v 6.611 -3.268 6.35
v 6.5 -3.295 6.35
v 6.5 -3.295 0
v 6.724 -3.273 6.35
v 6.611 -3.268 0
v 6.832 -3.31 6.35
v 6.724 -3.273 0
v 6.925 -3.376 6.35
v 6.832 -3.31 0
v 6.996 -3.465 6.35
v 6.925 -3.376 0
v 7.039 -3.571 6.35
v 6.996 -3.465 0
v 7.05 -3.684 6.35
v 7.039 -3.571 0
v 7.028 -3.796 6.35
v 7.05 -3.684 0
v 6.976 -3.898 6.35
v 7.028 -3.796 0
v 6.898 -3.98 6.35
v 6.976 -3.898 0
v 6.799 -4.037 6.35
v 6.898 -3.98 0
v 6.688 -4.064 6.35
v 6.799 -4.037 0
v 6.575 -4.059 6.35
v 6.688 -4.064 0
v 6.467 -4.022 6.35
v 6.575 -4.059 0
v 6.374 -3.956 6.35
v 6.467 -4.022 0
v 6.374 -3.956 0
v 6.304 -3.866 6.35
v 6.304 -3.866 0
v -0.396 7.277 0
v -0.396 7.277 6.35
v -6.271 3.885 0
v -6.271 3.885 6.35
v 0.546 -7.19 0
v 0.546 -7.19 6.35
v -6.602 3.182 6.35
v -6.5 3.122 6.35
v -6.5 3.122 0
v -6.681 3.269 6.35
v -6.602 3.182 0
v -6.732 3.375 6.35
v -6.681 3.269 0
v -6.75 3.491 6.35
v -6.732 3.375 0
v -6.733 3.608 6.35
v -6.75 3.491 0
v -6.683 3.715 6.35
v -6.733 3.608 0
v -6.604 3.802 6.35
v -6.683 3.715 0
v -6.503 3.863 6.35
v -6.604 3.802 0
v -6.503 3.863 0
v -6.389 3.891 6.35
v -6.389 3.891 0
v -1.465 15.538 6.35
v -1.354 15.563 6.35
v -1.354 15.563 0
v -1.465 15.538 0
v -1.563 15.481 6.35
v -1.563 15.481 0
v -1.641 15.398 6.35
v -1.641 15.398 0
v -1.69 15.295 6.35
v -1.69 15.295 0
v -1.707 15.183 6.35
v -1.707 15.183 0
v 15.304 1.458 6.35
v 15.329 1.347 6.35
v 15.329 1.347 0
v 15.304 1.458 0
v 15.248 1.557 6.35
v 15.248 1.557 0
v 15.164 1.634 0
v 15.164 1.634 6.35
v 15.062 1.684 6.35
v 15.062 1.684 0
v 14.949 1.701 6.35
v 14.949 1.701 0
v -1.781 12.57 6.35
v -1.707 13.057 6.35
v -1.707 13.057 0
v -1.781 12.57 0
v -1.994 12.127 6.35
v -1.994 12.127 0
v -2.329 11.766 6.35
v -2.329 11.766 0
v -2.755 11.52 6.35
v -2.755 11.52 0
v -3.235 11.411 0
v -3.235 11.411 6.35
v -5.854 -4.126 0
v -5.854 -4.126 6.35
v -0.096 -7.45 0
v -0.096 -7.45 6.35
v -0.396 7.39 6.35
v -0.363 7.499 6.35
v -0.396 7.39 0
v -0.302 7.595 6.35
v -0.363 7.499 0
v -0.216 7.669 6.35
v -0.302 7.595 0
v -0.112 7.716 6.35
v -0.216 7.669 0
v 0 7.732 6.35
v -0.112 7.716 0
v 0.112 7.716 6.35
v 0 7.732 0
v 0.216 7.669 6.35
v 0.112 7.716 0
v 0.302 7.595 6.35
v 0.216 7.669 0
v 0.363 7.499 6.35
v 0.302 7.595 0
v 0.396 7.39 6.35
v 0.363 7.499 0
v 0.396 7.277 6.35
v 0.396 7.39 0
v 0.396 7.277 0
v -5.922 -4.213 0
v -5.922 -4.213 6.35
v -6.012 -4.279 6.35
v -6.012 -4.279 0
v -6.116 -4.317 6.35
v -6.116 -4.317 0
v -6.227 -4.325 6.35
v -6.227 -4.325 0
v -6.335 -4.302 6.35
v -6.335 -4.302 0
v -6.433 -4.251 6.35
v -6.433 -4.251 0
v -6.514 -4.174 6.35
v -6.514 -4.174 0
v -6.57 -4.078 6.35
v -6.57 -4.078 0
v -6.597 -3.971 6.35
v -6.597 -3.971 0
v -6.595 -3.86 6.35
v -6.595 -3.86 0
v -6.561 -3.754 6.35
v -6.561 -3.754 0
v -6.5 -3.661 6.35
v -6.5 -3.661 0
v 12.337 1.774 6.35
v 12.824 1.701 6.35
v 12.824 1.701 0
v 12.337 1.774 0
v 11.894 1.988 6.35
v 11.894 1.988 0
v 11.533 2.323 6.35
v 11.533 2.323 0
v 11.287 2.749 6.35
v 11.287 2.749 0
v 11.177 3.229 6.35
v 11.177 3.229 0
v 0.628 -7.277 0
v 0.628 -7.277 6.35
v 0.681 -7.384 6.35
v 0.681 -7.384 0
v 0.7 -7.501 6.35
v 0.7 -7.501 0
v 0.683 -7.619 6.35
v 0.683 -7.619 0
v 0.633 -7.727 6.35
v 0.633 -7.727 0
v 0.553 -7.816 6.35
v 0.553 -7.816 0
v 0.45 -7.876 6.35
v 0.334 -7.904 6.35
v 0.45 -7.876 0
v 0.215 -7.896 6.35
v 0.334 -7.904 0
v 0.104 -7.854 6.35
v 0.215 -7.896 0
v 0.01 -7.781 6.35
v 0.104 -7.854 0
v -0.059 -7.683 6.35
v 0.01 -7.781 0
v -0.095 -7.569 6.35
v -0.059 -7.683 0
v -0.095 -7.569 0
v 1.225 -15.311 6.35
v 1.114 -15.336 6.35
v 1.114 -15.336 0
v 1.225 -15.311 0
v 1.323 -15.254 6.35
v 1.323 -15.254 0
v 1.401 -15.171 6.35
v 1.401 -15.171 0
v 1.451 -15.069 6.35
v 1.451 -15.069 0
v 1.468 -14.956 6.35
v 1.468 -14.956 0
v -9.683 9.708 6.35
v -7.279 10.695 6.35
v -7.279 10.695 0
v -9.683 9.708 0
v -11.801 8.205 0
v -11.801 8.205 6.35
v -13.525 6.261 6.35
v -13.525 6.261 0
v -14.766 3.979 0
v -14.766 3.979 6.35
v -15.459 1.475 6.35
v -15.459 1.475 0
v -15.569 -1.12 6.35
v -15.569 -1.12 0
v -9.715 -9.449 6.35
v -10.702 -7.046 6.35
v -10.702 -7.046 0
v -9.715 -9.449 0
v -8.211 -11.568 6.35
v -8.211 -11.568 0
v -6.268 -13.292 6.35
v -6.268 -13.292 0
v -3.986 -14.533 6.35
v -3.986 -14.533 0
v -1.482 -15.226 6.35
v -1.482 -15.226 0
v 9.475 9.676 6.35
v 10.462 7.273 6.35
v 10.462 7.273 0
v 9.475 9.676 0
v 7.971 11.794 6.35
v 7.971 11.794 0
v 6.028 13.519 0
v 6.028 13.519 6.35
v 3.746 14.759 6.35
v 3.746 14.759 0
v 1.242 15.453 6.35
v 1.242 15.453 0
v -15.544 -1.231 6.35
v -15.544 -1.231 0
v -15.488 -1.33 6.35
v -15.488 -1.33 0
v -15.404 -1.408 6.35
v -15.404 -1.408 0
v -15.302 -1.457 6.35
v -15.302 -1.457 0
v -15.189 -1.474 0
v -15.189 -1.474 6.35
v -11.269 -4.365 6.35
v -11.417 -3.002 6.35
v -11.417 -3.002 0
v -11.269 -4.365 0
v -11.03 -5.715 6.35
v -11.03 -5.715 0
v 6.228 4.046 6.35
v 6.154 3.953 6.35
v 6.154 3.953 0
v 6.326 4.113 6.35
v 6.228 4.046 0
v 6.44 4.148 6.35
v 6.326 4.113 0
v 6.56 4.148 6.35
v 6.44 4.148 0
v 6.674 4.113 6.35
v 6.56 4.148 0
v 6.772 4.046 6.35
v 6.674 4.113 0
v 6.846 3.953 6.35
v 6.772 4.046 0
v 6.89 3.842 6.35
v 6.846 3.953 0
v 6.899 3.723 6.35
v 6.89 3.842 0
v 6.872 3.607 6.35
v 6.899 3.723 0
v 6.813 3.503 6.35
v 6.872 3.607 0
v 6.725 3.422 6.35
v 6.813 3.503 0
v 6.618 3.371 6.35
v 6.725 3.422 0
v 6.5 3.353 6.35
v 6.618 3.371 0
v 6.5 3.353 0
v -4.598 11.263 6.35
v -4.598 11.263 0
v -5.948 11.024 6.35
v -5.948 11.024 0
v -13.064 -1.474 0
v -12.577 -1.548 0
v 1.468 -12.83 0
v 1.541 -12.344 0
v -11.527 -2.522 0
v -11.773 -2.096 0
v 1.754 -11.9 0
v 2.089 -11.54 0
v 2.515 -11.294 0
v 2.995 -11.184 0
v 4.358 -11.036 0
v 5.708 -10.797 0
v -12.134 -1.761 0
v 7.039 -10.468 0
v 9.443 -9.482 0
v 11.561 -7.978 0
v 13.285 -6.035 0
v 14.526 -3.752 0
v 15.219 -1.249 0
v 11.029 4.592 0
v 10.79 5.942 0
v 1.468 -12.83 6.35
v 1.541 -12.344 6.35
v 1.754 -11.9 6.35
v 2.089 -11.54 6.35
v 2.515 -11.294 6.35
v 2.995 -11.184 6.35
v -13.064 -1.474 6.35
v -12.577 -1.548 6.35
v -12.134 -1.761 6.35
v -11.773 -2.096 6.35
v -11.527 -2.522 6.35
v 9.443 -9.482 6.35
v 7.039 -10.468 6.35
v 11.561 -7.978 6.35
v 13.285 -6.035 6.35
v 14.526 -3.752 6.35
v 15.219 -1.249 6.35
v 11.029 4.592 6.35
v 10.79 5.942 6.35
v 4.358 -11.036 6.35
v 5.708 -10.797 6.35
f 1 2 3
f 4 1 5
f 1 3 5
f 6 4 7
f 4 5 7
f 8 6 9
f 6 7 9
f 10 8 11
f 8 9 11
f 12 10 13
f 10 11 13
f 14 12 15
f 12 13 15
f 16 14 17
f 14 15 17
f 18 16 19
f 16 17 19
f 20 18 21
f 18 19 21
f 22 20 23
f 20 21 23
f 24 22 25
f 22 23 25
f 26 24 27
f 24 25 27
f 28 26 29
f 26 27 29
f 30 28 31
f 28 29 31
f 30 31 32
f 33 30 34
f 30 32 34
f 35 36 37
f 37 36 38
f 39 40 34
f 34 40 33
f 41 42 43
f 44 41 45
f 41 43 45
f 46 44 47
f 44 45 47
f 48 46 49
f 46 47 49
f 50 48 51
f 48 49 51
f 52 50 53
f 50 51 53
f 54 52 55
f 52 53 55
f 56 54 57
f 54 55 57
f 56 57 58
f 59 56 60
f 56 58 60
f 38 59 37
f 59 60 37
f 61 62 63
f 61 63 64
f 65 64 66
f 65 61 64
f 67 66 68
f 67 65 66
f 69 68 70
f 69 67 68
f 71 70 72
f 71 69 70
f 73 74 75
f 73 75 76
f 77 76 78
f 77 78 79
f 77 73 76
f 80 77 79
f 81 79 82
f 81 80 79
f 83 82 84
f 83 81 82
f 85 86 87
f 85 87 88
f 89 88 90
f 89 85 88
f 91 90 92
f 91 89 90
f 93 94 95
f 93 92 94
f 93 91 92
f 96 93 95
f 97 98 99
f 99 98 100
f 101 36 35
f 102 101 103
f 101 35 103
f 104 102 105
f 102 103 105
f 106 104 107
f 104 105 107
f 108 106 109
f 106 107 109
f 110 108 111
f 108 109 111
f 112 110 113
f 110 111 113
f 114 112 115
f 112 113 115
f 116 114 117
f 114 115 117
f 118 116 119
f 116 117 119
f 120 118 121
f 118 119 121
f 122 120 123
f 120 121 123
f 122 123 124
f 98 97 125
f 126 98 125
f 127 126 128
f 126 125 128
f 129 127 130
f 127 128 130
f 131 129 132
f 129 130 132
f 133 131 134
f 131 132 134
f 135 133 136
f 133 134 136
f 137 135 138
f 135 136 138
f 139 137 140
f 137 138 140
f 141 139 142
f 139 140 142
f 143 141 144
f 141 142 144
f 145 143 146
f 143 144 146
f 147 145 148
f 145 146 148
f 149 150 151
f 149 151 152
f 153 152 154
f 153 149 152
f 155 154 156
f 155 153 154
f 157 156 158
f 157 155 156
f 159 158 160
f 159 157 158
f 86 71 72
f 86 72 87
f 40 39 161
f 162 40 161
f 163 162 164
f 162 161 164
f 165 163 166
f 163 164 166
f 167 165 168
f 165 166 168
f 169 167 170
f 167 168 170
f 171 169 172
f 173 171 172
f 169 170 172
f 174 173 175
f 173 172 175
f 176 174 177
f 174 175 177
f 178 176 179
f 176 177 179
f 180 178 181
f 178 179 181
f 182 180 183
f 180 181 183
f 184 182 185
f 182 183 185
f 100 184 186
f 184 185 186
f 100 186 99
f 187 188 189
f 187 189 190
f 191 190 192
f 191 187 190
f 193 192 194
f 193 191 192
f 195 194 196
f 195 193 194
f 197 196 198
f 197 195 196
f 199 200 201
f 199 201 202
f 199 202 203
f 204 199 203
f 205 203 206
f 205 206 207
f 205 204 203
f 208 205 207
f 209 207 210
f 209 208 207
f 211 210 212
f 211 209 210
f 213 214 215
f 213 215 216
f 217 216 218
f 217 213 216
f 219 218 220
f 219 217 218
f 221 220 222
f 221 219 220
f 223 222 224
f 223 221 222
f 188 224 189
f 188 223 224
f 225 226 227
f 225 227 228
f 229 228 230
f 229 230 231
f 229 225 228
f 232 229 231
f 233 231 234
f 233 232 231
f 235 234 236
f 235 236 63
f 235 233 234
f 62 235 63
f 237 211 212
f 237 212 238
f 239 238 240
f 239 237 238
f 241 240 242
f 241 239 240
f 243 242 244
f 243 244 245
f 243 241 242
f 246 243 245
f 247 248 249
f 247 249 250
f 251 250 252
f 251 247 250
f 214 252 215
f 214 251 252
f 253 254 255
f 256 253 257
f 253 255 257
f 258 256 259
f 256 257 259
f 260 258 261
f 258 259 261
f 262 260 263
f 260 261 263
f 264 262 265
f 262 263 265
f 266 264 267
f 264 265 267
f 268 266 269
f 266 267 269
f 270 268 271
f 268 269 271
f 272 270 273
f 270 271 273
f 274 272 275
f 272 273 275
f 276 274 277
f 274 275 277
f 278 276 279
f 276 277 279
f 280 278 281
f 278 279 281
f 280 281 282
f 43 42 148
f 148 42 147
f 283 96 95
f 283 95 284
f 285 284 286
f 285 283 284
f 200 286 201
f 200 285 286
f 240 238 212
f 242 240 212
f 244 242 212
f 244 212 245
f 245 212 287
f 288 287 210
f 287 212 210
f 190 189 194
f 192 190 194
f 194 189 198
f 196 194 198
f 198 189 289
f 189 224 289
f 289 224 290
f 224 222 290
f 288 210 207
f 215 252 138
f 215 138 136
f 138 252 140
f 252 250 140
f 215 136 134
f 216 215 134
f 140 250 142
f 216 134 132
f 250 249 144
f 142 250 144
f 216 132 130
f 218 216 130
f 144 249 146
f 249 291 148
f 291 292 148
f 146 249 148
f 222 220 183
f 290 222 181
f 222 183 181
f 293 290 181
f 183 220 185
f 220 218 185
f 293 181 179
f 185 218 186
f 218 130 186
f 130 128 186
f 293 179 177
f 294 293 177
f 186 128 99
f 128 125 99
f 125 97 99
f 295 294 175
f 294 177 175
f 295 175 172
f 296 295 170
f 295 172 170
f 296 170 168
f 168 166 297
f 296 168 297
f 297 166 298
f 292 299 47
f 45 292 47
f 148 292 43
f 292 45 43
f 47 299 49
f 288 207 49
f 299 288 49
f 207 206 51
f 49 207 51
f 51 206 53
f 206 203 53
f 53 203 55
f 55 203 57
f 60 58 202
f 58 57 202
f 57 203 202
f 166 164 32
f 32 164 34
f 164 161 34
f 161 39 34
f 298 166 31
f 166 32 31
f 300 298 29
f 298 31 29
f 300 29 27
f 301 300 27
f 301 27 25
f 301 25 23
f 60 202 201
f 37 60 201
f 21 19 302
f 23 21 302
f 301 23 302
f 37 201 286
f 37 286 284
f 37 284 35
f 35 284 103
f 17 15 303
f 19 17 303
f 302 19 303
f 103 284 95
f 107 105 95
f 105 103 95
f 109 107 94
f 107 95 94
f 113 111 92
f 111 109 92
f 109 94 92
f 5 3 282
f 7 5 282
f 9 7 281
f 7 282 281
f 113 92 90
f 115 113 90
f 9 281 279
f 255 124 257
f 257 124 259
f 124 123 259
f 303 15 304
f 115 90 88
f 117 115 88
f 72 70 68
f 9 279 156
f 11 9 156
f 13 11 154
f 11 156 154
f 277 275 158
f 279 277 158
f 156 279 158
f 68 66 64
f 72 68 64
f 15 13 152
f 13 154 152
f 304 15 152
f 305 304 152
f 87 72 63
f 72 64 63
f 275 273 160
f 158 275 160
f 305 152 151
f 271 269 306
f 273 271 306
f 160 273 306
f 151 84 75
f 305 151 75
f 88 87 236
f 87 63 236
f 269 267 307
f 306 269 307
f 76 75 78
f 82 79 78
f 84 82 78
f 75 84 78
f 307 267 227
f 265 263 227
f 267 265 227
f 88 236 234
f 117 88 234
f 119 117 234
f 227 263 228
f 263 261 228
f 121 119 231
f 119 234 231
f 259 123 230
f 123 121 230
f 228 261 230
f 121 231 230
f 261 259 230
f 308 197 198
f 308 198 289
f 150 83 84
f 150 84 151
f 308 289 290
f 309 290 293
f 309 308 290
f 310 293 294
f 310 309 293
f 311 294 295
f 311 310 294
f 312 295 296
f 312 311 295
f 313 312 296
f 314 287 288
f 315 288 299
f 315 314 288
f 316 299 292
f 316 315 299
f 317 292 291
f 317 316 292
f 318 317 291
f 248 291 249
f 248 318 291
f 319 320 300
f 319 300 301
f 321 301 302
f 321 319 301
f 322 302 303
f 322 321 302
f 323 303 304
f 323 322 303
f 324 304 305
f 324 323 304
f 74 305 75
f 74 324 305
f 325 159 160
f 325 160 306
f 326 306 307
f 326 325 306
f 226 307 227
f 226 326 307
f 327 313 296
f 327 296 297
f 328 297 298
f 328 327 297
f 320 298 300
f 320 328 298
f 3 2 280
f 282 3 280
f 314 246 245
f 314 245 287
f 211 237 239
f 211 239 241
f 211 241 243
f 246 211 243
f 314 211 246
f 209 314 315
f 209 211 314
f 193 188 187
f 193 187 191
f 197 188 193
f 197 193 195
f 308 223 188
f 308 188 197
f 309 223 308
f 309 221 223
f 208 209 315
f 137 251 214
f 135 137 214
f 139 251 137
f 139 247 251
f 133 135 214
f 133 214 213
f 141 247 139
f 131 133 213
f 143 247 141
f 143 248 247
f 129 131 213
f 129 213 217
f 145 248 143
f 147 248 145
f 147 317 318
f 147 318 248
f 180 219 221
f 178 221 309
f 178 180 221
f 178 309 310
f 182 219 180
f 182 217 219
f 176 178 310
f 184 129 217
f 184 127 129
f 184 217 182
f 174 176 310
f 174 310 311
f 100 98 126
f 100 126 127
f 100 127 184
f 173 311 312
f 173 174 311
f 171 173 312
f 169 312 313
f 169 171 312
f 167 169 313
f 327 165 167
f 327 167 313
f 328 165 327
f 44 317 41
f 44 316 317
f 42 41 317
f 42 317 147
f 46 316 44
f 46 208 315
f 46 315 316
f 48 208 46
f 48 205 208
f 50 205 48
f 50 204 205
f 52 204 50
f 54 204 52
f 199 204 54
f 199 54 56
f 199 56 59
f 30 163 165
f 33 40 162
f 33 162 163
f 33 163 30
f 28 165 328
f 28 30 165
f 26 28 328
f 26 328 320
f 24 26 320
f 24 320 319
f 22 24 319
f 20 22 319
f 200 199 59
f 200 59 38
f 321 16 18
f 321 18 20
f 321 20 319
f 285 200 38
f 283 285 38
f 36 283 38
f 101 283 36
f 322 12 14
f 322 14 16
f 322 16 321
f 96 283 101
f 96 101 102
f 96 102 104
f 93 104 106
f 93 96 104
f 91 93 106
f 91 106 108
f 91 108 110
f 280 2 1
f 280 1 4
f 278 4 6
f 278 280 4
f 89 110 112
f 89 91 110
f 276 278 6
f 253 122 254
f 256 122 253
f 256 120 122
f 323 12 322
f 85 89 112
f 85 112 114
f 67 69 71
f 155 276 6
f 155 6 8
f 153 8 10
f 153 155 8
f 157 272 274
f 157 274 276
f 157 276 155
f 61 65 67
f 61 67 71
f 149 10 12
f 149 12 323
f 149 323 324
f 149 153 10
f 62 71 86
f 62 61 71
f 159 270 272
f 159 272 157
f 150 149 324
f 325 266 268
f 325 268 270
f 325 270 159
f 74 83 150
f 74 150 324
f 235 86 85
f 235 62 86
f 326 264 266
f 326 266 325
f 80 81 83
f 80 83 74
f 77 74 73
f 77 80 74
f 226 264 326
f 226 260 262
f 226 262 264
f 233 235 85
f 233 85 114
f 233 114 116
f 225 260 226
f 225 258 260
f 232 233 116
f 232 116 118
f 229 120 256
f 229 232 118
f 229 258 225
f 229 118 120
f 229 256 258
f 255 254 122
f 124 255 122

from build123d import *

# Parameters (mm, degrees)
SKETCH1_R           = 16
BOSS_EXTRUDE1_DEPTH = 6.35
SKETCH2_OUTSIDE_W   = 43.14
SKETCH2_OUTSIDE_H   = 43.14
CUT_EXTRUDE1_DEPTH  = 7.35
CUT_EXTRUDE2_DEPTH  = 7.35
CUT_EXTRUDE3_REACH  = 8.35
SKETCH4_R           = 0.4


with BuildPart() as part:
    # Sketch1 → Boss-Extrude1 (new body)
    with BuildSketch(Plane.XY):
        Circle(SKETCH1_R)
    extrude(amount=BOSS_EXTRUDE1_DEPTH)

    # Sketch2 outside → Cut-Extrude1 (cut, through all)
    with BuildSketch(Plane.XY.offset(6.35)):
        Rectangle(SKETCH2_OUTSIDE_W, SKETCH2_OUTSIDE_H)
        with BuildLine():
            Line((14.949348906, 1.700814958), (12.823807348, 1.700814958))
            ThreePointArc((12.823807348, 1.700814958), (11.700778028, 2.141605825), (11.177410812, 3.228610057))
            ThreePointArc((11.177410812, 3.228610057), (10.921226769, 5.268595293), (10.461728017, 7.272599017))
            ThreePointArc((10.461728017, 7.272599017), (6.02807025, 13.518558738), (-1.353723941, 15.562684117))
            ThreePointArc((-1.353723941, 15.562684117), (-1.605363135, 15.44226057), (-1.707494519, 15.182658383))
            Line((-1.707494519, 15.182658383), (-1.707494519, 13.057116825))
            ThreePointArc((-1.707494519, 13.057116825), (-2.148285386, 11.934087504), (-3.235289619, 11.410720289))
            ThreePointArc((-3.235289619, 11.410720289), (-5.275274855, 11.154536246), (-7.279278578, 10.695037493))
            ThreePointArc((-7.279278578, 10.695037493), (-13.525238299, 6.261379727), (-15.569363679, -1.120414464))
            ThreePointArc((-15.569363679, -1.120414464), (-15.448940131, -1.372053658), (-15.189337945, -1.474185042))
            Line((-15.189337945, -1.474185042), (-13.063796386, -1.474185042))
            ThreePointArc((-13.063796386, -1.474185042), (-11.940767066, -1.914975909), (-11.417399851, -3.001980142))
            ThreePointArc((-11.417399851, -3.001980142), (-11.161215808, -5.041965378), (-10.701717055, -7.045969101))
            ThreePointArc((-10.701717055, -7.045969101), (-6.268059288, -13.291928823), (1.113734902, -15.336054202))
            ThreePointArc((1.113734902, -15.336054202), (1.365374097, -15.215630654), (1.467505481, -14.956028468))
            Line((1.467505481, -14.956028468), (1.467505481, -12.830486909))
            ThreePointArc((1.467505481, -12.830486909), (1.908296348, -11.707457589), (2.99530058, -11.184090374))
            ThreePointArc((2.99530058, -11.184090374), (5.035285816, -10.927906331), (7.03928954, -10.468407578))
            ThreePointArc((7.03928954, -10.468407578), (13.285249261, -6.034749811), (15.32937464, 1.347044379))
            ThreePointArc((15.32937464, 1.347044379), (15.208951093, 1.598683573), (14.949348906, 1.700814958))
        make_face(mode=Mode.SUBTRACT)
    extrude(amount=-CUT_EXTRUDE1_DEPTH, mode=Mode.SUBTRACT)

    # Sketch3 → Cut-Extrude2 (cut, through all)
    with BuildSketch(Plane.XY.offset(6.35)):
        Polygon((0, 7.505553499), (-6.5, 3.75277675), (-6.5, -3.75277675), (0, -7.505553499), (6.5, -3.75277675), (6.5, 3.75277675), align=None)
    extrude(amount=-CUT_EXTRUDE2_DEPTH, mode=Mode.SUBTRACT)

    # Sketch4 → Cut-Extrude3 (cut, up to next)
    with BuildSketch(Plane(origin=(0, 0, 0), x_dir=(-1, 0, 0), z_dir=(0, 0, -1)), mode=Mode.PRIVATE) as cut_extrude3_sk1:
        with Locations((-6.5, 3.75277675)):
            Circle(SKETCH4_R)
    cut_extrude3_tool1 = extrude(cut_extrude3_sk1.sketch, amount=-CUT_EXTRUDE3_REACH, mode=Mode.PRIVATE) & part.part
    add(cut_extrude3_tool1.solids().sort_by_distance((6.5, 3.752777, 0))[0], mode=Mode.SUBTRACT)
    # Sketch4 → Cut-Extrude3 (cut, up to next)
    with BuildSketch(Plane(origin=(0, 0, 0), x_dir=(-1, 0, 0), z_dir=(0, 0, -1)), mode=Mode.PRIVATE) as cut_extrude3_sk2:
        with Locations((0, 7.332348419)):
            Circle(SKETCH4_R)
    cut_extrude3_tool2 = extrude(cut_extrude3_sk2.sketch, amount=-CUT_EXTRUDE3_REACH, mode=Mode.PRIVATE) & part.part
    add(cut_extrude3_tool2.solids().sort_by_distance((0, 7.332348, 0))[0], mode=Mode.SUBTRACT)
    # Sketch4 → Cut-Extrude3 (cut, up to next)
    with BuildSketch(Plane(origin=(0, 0, 0), x_dir=(-1, 0, 0), z_dir=(0, 0, -1)), mode=Mode.PRIVATE) as cut_extrude3_sk3:
        with Locations((6.35, 3.492969129)):
            Circle(SKETCH4_R)
    cut_extrude3_tool3 = extrude(cut_extrude3_sk3.sketch, amount=-CUT_EXTRUDE3_REACH, mode=Mode.PRIVATE) & part.part
    add(cut_extrude3_tool3.solids().sort_by_distance((-6.35, 3.492969, 0))[0], mode=Mode.SUBTRACT)
    # Sketch4 → Cut-Extrude3 (cut, up to next)
    with BuildSketch(Plane(origin=(0, 0, 0), x_dir=(-1, 0, 0), z_dir=(0, 0, -1)), mode=Mode.PRIVATE) as cut_extrude3_sk4:
        with Locations((6.2, -3.92598183)):
            Circle(SKETCH4_R)
    cut_extrude3_tool4 = extrude(cut_extrude3_sk4.sketch, amount=-CUT_EXTRUDE3_REACH, mode=Mode.PRIVATE) & part.part
    add(cut_extrude3_tool4.solids().sort_by_distance((-6.2, -3.925982, 0))[0], mode=Mode.SUBTRACT)
    # Sketch4 → Cut-Extrude3 (cut, up to next)
    with BuildSketch(Plane(origin=(0, 0, 0), x_dir=(-1, 0, 0), z_dir=(0, 0, -1)), mode=Mode.PRIVATE) as cut_extrude3_sk5:
        with Locations((-0.3, -7.505553499)):
            Circle(SKETCH4_R)
    cut_extrude3_tool5 = extrude(cut_extrude3_sk5.sketch, amount=-CUT_EXTRUDE3_REACH, mode=Mode.PRIVATE) & part.part
    add(cut_extrude3_tool5.solids().sort_by_distance((0.3, -7.505553, 0))[0], mode=Mode.SUBTRACT)
    # Sketch4 → Cut-Extrude3 (cut, up to next)
    with BuildSketch(Plane(origin=(0, 0, 0), x_dir=(-1, 0, 0), z_dir=(0, 0, -1)), mode=Mode.PRIVATE) as cut_extrude3_sk6:
        with Locations((-6.65, -3.666174209)):
            Circle(SKETCH4_R)
    cut_extrude3_tool6 = extrude(cut_extrude3_sk6.sketch, amount=-CUT_EXTRUDE3_REACH, mode=Mode.PRIVATE) & part.part
    add(cut_extrude3_tool6.solids().sort_by_distance((6.65, -3.666174, 0))[0], mode=Mode.SUBTRACT)


solid = part.part
